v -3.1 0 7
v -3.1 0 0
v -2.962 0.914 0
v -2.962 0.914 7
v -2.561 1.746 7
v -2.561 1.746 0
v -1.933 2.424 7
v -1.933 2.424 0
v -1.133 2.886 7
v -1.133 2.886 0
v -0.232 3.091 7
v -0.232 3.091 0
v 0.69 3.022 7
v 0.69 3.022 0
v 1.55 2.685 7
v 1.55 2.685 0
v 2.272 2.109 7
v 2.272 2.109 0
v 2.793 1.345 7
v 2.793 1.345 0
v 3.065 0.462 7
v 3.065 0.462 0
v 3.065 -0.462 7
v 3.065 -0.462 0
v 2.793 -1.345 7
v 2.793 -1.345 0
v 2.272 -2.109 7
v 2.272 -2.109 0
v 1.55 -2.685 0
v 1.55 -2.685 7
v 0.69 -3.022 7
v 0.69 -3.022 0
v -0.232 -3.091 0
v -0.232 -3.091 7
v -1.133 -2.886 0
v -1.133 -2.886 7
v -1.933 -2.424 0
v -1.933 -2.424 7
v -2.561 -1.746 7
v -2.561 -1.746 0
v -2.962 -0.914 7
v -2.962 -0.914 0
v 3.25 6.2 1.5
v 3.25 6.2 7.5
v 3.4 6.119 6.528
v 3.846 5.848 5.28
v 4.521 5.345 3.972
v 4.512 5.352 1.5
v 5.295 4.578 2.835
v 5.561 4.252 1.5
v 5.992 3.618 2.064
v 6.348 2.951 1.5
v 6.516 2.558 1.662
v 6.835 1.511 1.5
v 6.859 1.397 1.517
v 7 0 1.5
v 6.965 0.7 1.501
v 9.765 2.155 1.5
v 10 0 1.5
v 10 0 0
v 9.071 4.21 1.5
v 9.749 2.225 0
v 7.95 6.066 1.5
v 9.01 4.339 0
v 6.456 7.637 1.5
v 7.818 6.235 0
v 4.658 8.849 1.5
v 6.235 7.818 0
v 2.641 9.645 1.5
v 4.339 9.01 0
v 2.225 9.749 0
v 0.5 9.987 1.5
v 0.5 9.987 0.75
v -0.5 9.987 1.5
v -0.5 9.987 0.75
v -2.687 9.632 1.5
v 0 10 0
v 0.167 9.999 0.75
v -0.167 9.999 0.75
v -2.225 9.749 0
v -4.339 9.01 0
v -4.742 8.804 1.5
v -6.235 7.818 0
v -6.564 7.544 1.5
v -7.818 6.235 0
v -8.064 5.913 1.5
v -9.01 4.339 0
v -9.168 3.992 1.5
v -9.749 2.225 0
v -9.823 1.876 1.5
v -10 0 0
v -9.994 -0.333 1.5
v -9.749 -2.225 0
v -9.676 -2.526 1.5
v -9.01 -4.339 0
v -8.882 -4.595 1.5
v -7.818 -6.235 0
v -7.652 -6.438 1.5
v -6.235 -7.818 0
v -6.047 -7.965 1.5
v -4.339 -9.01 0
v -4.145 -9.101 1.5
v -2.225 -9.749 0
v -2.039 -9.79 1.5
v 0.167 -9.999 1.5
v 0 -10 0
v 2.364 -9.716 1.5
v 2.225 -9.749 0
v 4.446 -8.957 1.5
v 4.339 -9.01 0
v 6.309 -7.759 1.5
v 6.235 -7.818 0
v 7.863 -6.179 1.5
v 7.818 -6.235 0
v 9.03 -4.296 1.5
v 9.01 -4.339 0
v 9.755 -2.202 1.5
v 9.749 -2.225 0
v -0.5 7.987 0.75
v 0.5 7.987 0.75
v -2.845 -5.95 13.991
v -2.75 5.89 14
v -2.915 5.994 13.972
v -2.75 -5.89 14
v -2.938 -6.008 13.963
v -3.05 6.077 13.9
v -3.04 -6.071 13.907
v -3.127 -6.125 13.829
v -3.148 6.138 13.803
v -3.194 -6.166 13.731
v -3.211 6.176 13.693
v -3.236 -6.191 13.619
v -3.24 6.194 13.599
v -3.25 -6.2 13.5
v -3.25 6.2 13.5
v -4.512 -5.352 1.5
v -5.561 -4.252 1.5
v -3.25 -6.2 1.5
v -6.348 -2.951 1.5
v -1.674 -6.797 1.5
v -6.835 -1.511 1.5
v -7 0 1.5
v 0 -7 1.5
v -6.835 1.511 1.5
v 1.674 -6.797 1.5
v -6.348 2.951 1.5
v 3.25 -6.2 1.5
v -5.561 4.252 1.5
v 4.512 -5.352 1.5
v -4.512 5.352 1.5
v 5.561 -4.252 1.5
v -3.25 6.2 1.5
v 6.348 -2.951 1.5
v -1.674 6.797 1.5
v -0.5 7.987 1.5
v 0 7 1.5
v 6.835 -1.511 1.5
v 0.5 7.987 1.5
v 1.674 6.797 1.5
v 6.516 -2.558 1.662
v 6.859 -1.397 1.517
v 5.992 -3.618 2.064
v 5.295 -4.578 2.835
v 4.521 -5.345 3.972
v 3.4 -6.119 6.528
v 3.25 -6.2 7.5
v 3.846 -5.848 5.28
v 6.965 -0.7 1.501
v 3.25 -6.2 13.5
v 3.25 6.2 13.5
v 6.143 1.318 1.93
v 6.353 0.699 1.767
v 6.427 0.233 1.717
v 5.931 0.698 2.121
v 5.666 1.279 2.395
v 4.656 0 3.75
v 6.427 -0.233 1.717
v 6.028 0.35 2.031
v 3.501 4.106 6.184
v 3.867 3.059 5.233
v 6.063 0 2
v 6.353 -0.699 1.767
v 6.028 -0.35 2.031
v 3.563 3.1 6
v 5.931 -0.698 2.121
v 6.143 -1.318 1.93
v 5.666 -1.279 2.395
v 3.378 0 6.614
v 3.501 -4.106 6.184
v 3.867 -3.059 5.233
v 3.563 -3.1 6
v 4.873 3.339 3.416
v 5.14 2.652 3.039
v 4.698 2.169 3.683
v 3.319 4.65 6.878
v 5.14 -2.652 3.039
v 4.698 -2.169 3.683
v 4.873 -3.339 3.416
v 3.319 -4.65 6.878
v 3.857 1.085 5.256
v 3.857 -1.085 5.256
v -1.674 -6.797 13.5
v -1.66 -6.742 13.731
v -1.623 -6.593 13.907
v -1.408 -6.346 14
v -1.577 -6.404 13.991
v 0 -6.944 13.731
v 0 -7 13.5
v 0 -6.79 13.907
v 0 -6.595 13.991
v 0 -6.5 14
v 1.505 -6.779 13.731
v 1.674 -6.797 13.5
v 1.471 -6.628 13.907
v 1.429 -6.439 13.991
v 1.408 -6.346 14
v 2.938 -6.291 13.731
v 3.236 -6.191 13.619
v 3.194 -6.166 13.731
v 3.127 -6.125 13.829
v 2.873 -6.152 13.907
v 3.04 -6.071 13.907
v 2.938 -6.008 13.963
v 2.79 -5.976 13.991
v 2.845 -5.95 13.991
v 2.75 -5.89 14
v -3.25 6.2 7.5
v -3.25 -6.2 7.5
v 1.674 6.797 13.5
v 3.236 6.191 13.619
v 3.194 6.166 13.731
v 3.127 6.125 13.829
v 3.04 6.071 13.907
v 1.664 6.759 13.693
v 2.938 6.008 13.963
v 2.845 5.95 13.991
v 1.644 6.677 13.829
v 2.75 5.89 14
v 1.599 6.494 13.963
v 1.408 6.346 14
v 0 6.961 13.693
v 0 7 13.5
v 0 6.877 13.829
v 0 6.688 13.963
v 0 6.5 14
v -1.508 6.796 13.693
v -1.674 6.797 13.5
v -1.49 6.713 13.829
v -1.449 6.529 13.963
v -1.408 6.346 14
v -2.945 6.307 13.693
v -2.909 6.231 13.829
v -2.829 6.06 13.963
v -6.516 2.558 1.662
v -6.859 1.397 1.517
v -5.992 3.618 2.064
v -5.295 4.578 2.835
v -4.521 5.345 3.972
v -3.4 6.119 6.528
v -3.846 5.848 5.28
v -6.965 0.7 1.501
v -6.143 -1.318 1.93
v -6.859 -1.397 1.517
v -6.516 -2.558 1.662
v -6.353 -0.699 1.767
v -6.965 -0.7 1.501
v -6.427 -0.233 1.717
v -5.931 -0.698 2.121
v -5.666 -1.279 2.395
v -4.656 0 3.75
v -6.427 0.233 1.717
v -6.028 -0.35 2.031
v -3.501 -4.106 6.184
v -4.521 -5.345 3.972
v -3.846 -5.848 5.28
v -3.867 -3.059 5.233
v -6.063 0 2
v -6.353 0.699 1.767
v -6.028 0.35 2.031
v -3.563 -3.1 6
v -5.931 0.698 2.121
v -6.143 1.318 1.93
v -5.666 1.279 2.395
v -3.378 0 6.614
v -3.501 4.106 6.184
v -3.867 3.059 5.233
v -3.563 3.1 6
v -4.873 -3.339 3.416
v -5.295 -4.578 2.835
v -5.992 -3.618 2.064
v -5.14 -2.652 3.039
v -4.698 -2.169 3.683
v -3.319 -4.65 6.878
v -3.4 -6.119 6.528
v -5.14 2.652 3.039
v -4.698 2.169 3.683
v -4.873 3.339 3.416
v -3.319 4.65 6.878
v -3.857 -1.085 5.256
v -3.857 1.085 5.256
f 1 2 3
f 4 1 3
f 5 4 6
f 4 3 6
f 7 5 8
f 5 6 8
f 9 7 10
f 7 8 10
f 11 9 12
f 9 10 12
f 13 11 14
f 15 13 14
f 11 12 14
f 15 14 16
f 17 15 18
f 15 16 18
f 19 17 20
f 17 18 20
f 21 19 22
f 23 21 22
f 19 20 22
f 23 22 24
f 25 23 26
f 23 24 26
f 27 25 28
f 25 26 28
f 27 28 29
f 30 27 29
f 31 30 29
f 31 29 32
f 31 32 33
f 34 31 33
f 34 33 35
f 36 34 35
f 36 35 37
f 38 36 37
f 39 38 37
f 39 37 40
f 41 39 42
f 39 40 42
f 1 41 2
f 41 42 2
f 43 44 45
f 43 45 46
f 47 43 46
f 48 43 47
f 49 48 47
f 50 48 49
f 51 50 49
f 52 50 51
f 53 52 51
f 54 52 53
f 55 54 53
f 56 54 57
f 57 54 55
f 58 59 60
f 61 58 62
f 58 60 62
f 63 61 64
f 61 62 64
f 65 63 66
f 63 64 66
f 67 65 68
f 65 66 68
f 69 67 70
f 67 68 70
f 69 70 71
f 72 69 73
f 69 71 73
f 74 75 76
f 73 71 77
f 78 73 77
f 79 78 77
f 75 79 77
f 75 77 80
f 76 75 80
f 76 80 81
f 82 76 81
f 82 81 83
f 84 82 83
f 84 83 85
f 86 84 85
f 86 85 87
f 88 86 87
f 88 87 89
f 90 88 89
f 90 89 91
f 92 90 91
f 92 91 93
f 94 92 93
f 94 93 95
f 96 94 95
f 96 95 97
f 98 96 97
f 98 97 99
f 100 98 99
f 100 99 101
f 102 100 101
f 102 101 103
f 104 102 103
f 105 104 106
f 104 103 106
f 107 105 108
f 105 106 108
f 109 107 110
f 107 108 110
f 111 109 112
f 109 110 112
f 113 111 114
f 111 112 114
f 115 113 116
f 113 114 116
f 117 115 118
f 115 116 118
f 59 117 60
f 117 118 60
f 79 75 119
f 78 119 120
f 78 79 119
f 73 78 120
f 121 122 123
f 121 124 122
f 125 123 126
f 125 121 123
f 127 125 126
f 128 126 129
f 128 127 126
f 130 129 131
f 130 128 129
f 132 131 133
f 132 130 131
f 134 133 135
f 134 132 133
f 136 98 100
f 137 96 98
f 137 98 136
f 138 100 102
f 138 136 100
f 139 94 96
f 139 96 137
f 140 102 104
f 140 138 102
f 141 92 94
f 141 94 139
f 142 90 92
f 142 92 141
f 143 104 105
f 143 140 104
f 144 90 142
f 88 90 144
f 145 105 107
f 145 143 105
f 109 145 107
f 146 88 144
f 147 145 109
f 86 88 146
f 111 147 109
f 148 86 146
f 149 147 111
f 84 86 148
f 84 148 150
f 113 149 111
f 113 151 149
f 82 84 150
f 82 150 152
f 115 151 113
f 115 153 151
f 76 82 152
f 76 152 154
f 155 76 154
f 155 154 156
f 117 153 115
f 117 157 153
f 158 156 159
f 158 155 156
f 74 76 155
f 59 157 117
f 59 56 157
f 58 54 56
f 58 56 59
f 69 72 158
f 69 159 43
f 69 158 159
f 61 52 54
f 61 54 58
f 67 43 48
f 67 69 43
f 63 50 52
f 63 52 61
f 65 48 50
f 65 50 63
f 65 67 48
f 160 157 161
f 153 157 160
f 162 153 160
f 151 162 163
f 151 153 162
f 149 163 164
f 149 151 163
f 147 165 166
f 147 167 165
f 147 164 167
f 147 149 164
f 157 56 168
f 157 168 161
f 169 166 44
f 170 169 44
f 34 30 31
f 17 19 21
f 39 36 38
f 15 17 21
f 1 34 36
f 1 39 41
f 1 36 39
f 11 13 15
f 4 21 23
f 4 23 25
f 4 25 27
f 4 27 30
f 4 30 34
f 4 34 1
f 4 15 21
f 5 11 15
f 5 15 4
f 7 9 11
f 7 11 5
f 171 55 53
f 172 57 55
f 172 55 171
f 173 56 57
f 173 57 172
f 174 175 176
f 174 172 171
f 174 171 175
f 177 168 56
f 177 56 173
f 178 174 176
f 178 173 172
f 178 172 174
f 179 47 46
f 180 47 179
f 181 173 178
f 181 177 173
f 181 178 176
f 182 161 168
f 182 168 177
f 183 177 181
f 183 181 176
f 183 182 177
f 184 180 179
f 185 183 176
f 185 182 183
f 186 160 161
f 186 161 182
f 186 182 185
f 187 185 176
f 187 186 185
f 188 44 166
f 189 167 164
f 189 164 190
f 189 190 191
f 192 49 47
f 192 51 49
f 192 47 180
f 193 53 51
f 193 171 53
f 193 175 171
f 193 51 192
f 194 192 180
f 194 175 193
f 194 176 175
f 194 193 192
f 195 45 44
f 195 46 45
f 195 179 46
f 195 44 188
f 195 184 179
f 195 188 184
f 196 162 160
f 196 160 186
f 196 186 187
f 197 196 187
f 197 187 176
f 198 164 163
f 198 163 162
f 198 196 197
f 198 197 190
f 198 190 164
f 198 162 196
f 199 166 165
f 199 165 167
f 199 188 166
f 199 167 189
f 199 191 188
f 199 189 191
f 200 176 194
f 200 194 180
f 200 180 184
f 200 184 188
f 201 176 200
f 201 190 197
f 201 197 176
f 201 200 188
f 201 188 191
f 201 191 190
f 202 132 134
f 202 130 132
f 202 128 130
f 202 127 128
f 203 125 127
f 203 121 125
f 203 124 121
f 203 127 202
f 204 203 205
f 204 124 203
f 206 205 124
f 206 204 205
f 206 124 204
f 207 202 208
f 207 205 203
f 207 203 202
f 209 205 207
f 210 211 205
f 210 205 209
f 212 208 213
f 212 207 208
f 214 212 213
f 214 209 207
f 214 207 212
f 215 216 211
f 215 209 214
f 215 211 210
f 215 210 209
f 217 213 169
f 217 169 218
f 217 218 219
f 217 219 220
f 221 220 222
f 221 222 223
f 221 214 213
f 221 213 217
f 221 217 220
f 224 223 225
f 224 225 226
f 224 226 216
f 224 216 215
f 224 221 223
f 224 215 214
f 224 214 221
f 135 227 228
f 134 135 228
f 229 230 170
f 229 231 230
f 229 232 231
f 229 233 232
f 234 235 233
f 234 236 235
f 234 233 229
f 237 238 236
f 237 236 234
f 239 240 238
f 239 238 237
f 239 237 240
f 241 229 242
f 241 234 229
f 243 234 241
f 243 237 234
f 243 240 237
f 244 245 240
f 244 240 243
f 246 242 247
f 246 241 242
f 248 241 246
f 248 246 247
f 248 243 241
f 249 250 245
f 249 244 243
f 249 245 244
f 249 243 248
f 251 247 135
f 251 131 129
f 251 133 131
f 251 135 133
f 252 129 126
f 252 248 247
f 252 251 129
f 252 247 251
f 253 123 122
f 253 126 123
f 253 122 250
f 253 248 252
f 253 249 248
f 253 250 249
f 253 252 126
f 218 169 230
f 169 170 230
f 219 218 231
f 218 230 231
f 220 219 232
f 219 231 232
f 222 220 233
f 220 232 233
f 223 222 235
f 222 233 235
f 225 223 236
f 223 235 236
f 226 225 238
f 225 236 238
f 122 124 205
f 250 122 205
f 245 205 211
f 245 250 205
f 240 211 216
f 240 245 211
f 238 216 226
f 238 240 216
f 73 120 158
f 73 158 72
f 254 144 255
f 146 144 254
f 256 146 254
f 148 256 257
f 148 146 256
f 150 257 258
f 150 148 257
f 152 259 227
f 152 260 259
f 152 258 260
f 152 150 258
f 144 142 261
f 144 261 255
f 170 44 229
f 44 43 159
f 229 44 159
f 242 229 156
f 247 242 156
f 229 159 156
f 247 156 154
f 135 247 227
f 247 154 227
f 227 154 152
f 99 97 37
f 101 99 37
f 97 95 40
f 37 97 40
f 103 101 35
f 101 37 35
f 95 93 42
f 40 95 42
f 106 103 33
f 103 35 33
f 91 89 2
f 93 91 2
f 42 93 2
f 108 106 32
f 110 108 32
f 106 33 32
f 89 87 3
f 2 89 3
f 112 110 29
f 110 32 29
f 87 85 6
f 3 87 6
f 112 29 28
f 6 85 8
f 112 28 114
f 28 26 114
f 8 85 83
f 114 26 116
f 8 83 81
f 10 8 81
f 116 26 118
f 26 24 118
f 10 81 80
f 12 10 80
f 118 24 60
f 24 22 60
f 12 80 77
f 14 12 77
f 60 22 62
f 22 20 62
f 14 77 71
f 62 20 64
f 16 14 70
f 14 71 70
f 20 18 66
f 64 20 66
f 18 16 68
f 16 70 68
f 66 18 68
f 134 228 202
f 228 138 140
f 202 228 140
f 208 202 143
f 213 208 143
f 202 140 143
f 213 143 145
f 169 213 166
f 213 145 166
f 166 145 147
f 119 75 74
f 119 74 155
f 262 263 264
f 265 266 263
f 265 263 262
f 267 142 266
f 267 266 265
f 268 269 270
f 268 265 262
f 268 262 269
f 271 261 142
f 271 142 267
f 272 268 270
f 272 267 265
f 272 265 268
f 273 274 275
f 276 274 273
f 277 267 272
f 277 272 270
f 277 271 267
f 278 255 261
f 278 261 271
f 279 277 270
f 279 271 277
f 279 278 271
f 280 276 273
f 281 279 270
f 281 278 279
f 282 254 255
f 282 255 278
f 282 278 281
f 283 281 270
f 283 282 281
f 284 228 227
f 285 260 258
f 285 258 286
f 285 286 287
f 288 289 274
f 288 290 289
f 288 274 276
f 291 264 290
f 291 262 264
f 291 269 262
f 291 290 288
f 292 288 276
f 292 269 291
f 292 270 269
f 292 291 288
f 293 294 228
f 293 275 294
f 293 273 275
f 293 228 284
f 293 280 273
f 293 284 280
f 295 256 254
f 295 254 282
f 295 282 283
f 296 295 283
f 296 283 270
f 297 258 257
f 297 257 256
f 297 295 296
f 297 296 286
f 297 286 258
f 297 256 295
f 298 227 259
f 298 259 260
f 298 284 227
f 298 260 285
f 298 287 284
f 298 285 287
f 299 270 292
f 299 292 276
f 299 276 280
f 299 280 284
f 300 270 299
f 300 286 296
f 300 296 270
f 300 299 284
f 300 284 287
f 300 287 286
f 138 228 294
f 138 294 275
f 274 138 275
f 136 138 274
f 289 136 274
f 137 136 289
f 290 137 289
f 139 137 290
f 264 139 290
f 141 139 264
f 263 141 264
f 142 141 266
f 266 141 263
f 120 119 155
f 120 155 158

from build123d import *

# Parameters (mm, degrees)
SKETCH1_R           = 10
BOSS_EXTRUDE1_DEPTH = 1.5
BOSS_EXTRUDE2_DEPTH = 12.5
CUT_EXTRUDE2_START  = -0.75
CUT_EXTRUDE2_DEPTH  = 0.75
SKETCH5_R           = 3.1
CUT_EXTRUDE3_DEPTH  = 7
FILLET5_SIZE        = 3.75
FILLET5_SIZE_2      = 6
FILLET6_R           = 0.5


with BuildPart() as part:
    # Sketch1 → Boss-Extrude1 (new body)
    with BuildSketch(Plane.XY):
        Circle(SKETCH1_R)
    extrude(amount=BOSS_EXTRUDE1_DEPTH)

    # Sketch2 → Boss-Extrude2 (add)
    with BuildSketch(Plane.XY.offset(1.5)):
        with BuildLine():
            Line((-3.25, 6.199798384), (-3.25, -6.199798384))
            ThreePointArc((-3.25, -6.199798384), (0, -7), (3.25, -6.199798384))
            Line((3.25, -6.199798384), (3.25, 6.199798384))
            ThreePointArc((3.25, 6.199798384), (0, 7), (-3.25, 6.199798384))
        make_face()
    extrude(amount=BOSS_EXTRUDE2_DEPTH)

    # Sketch4 → Cut-Extrude2 (cut)
    with BuildSketch(Plane.XY.offset(1.5).offset(CUT_EXTRUDE2_START)):
        with BuildLine():
            Line((-0.5, 9.987492178), (-0.5, 7.987492178))
            Line((-0.5, 7.987492178), (0.5, 7.987492178))
            Line((0.5, 7.987492178), (0.5, 9.987492178))
            ThreePointArc((0.5, 9.987492178), (0, 10), (-0.5, 9.987492178))
        make_face()
    extrude(amount=CUT_EXTRUDE2_DEPTH, mode=Mode.SUBTRACT)

    # Sketch5 → Cut-Extrude3 (cut)
    with BuildSketch(Plane(origin=(0, 0, 0), x_dir=(-1, 0, 0), z_dir=(0, 0, -1))):
        Circle(SKETCH5_R)
    extrude(amount=-CUT_EXTRUDE3_DEPTH, mode=Mode.SUBTRACT)

    # Fillet5
    # a fillet whose section is not a circle: 6, 3.75 mm, written as the material it adds along each edge
    with BuildSketch(Plane(origin=(-3.25, 21.199798384, 1.5), x_dir=(-1, 0, 0), z_dir=(0, -1, 0))) as fillet5_piece_1_section:
        with BuildLine():
            Bezier((FILLET5_SIZE, 0), (0, 0), (0, -FILLET5_SIZE_2), weights=[1, 0.333333333, 1])
            Line((0, -FILLET5_SIZE_2), (0, 0))
            Line((0, 0), (FILLET5_SIZE, 0))
        make_face()
    fillet5_piece_1 = extrude(amount=42.399596768, mode=Mode.PRIVATE)
    fillet5_piece_1 = fillet5_piece_1 & Plane(origin=(0, 0, 1.5), x_dir=(0.4642857142857146, 0.8856854834026602, 0), z_dir=(0, 0, -1)) * Cylinder(7, 109, mode=Mode.PRIVATE)
    add(fillet5_piece_1)
    with BuildSketch(Plane(origin=(3.25, -21.199798384, 1.5), x_dir=(1, 0, 0), z_dir=(0, 1, 0))) as fillet5_piece_2_section:
        with BuildLine():
            Bezier((FILLET5_SIZE, 0), (0, 0), (0, -FILLET5_SIZE_2), weights=[1, 0.333333333, 1])
            Line((0, -FILLET5_SIZE_2), (0, 0))
            Line((0, 0), (FILLET5_SIZE, 0))
        make_face()
    fillet5_piece_2 = extrude(amount=42.399596768, mode=Mode.PRIVATE)
    fillet5_piece_2 = fillet5_piece_2 & Plane(origin=(0, 0, 1.5), x_dir=(0.4642857142857146, 0.8856854834026602, 0), z_dir=(0, 0, -1)) * Cylinder(7, 109, mode=Mode.PRIVATE)
    add(fillet5_piece_2)

    # Fillet6
    fillet6_edges = [part.edges().sort_by_distance(p)[0] for p in [
        (3.25, 0, 14),
        (0, -7, 14),
        (-3.25, 0, 14),
        (0, 7, 14),
    ]]
    fillet(fillet6_edges, radius=FILLET6_R)


solid = part.part
